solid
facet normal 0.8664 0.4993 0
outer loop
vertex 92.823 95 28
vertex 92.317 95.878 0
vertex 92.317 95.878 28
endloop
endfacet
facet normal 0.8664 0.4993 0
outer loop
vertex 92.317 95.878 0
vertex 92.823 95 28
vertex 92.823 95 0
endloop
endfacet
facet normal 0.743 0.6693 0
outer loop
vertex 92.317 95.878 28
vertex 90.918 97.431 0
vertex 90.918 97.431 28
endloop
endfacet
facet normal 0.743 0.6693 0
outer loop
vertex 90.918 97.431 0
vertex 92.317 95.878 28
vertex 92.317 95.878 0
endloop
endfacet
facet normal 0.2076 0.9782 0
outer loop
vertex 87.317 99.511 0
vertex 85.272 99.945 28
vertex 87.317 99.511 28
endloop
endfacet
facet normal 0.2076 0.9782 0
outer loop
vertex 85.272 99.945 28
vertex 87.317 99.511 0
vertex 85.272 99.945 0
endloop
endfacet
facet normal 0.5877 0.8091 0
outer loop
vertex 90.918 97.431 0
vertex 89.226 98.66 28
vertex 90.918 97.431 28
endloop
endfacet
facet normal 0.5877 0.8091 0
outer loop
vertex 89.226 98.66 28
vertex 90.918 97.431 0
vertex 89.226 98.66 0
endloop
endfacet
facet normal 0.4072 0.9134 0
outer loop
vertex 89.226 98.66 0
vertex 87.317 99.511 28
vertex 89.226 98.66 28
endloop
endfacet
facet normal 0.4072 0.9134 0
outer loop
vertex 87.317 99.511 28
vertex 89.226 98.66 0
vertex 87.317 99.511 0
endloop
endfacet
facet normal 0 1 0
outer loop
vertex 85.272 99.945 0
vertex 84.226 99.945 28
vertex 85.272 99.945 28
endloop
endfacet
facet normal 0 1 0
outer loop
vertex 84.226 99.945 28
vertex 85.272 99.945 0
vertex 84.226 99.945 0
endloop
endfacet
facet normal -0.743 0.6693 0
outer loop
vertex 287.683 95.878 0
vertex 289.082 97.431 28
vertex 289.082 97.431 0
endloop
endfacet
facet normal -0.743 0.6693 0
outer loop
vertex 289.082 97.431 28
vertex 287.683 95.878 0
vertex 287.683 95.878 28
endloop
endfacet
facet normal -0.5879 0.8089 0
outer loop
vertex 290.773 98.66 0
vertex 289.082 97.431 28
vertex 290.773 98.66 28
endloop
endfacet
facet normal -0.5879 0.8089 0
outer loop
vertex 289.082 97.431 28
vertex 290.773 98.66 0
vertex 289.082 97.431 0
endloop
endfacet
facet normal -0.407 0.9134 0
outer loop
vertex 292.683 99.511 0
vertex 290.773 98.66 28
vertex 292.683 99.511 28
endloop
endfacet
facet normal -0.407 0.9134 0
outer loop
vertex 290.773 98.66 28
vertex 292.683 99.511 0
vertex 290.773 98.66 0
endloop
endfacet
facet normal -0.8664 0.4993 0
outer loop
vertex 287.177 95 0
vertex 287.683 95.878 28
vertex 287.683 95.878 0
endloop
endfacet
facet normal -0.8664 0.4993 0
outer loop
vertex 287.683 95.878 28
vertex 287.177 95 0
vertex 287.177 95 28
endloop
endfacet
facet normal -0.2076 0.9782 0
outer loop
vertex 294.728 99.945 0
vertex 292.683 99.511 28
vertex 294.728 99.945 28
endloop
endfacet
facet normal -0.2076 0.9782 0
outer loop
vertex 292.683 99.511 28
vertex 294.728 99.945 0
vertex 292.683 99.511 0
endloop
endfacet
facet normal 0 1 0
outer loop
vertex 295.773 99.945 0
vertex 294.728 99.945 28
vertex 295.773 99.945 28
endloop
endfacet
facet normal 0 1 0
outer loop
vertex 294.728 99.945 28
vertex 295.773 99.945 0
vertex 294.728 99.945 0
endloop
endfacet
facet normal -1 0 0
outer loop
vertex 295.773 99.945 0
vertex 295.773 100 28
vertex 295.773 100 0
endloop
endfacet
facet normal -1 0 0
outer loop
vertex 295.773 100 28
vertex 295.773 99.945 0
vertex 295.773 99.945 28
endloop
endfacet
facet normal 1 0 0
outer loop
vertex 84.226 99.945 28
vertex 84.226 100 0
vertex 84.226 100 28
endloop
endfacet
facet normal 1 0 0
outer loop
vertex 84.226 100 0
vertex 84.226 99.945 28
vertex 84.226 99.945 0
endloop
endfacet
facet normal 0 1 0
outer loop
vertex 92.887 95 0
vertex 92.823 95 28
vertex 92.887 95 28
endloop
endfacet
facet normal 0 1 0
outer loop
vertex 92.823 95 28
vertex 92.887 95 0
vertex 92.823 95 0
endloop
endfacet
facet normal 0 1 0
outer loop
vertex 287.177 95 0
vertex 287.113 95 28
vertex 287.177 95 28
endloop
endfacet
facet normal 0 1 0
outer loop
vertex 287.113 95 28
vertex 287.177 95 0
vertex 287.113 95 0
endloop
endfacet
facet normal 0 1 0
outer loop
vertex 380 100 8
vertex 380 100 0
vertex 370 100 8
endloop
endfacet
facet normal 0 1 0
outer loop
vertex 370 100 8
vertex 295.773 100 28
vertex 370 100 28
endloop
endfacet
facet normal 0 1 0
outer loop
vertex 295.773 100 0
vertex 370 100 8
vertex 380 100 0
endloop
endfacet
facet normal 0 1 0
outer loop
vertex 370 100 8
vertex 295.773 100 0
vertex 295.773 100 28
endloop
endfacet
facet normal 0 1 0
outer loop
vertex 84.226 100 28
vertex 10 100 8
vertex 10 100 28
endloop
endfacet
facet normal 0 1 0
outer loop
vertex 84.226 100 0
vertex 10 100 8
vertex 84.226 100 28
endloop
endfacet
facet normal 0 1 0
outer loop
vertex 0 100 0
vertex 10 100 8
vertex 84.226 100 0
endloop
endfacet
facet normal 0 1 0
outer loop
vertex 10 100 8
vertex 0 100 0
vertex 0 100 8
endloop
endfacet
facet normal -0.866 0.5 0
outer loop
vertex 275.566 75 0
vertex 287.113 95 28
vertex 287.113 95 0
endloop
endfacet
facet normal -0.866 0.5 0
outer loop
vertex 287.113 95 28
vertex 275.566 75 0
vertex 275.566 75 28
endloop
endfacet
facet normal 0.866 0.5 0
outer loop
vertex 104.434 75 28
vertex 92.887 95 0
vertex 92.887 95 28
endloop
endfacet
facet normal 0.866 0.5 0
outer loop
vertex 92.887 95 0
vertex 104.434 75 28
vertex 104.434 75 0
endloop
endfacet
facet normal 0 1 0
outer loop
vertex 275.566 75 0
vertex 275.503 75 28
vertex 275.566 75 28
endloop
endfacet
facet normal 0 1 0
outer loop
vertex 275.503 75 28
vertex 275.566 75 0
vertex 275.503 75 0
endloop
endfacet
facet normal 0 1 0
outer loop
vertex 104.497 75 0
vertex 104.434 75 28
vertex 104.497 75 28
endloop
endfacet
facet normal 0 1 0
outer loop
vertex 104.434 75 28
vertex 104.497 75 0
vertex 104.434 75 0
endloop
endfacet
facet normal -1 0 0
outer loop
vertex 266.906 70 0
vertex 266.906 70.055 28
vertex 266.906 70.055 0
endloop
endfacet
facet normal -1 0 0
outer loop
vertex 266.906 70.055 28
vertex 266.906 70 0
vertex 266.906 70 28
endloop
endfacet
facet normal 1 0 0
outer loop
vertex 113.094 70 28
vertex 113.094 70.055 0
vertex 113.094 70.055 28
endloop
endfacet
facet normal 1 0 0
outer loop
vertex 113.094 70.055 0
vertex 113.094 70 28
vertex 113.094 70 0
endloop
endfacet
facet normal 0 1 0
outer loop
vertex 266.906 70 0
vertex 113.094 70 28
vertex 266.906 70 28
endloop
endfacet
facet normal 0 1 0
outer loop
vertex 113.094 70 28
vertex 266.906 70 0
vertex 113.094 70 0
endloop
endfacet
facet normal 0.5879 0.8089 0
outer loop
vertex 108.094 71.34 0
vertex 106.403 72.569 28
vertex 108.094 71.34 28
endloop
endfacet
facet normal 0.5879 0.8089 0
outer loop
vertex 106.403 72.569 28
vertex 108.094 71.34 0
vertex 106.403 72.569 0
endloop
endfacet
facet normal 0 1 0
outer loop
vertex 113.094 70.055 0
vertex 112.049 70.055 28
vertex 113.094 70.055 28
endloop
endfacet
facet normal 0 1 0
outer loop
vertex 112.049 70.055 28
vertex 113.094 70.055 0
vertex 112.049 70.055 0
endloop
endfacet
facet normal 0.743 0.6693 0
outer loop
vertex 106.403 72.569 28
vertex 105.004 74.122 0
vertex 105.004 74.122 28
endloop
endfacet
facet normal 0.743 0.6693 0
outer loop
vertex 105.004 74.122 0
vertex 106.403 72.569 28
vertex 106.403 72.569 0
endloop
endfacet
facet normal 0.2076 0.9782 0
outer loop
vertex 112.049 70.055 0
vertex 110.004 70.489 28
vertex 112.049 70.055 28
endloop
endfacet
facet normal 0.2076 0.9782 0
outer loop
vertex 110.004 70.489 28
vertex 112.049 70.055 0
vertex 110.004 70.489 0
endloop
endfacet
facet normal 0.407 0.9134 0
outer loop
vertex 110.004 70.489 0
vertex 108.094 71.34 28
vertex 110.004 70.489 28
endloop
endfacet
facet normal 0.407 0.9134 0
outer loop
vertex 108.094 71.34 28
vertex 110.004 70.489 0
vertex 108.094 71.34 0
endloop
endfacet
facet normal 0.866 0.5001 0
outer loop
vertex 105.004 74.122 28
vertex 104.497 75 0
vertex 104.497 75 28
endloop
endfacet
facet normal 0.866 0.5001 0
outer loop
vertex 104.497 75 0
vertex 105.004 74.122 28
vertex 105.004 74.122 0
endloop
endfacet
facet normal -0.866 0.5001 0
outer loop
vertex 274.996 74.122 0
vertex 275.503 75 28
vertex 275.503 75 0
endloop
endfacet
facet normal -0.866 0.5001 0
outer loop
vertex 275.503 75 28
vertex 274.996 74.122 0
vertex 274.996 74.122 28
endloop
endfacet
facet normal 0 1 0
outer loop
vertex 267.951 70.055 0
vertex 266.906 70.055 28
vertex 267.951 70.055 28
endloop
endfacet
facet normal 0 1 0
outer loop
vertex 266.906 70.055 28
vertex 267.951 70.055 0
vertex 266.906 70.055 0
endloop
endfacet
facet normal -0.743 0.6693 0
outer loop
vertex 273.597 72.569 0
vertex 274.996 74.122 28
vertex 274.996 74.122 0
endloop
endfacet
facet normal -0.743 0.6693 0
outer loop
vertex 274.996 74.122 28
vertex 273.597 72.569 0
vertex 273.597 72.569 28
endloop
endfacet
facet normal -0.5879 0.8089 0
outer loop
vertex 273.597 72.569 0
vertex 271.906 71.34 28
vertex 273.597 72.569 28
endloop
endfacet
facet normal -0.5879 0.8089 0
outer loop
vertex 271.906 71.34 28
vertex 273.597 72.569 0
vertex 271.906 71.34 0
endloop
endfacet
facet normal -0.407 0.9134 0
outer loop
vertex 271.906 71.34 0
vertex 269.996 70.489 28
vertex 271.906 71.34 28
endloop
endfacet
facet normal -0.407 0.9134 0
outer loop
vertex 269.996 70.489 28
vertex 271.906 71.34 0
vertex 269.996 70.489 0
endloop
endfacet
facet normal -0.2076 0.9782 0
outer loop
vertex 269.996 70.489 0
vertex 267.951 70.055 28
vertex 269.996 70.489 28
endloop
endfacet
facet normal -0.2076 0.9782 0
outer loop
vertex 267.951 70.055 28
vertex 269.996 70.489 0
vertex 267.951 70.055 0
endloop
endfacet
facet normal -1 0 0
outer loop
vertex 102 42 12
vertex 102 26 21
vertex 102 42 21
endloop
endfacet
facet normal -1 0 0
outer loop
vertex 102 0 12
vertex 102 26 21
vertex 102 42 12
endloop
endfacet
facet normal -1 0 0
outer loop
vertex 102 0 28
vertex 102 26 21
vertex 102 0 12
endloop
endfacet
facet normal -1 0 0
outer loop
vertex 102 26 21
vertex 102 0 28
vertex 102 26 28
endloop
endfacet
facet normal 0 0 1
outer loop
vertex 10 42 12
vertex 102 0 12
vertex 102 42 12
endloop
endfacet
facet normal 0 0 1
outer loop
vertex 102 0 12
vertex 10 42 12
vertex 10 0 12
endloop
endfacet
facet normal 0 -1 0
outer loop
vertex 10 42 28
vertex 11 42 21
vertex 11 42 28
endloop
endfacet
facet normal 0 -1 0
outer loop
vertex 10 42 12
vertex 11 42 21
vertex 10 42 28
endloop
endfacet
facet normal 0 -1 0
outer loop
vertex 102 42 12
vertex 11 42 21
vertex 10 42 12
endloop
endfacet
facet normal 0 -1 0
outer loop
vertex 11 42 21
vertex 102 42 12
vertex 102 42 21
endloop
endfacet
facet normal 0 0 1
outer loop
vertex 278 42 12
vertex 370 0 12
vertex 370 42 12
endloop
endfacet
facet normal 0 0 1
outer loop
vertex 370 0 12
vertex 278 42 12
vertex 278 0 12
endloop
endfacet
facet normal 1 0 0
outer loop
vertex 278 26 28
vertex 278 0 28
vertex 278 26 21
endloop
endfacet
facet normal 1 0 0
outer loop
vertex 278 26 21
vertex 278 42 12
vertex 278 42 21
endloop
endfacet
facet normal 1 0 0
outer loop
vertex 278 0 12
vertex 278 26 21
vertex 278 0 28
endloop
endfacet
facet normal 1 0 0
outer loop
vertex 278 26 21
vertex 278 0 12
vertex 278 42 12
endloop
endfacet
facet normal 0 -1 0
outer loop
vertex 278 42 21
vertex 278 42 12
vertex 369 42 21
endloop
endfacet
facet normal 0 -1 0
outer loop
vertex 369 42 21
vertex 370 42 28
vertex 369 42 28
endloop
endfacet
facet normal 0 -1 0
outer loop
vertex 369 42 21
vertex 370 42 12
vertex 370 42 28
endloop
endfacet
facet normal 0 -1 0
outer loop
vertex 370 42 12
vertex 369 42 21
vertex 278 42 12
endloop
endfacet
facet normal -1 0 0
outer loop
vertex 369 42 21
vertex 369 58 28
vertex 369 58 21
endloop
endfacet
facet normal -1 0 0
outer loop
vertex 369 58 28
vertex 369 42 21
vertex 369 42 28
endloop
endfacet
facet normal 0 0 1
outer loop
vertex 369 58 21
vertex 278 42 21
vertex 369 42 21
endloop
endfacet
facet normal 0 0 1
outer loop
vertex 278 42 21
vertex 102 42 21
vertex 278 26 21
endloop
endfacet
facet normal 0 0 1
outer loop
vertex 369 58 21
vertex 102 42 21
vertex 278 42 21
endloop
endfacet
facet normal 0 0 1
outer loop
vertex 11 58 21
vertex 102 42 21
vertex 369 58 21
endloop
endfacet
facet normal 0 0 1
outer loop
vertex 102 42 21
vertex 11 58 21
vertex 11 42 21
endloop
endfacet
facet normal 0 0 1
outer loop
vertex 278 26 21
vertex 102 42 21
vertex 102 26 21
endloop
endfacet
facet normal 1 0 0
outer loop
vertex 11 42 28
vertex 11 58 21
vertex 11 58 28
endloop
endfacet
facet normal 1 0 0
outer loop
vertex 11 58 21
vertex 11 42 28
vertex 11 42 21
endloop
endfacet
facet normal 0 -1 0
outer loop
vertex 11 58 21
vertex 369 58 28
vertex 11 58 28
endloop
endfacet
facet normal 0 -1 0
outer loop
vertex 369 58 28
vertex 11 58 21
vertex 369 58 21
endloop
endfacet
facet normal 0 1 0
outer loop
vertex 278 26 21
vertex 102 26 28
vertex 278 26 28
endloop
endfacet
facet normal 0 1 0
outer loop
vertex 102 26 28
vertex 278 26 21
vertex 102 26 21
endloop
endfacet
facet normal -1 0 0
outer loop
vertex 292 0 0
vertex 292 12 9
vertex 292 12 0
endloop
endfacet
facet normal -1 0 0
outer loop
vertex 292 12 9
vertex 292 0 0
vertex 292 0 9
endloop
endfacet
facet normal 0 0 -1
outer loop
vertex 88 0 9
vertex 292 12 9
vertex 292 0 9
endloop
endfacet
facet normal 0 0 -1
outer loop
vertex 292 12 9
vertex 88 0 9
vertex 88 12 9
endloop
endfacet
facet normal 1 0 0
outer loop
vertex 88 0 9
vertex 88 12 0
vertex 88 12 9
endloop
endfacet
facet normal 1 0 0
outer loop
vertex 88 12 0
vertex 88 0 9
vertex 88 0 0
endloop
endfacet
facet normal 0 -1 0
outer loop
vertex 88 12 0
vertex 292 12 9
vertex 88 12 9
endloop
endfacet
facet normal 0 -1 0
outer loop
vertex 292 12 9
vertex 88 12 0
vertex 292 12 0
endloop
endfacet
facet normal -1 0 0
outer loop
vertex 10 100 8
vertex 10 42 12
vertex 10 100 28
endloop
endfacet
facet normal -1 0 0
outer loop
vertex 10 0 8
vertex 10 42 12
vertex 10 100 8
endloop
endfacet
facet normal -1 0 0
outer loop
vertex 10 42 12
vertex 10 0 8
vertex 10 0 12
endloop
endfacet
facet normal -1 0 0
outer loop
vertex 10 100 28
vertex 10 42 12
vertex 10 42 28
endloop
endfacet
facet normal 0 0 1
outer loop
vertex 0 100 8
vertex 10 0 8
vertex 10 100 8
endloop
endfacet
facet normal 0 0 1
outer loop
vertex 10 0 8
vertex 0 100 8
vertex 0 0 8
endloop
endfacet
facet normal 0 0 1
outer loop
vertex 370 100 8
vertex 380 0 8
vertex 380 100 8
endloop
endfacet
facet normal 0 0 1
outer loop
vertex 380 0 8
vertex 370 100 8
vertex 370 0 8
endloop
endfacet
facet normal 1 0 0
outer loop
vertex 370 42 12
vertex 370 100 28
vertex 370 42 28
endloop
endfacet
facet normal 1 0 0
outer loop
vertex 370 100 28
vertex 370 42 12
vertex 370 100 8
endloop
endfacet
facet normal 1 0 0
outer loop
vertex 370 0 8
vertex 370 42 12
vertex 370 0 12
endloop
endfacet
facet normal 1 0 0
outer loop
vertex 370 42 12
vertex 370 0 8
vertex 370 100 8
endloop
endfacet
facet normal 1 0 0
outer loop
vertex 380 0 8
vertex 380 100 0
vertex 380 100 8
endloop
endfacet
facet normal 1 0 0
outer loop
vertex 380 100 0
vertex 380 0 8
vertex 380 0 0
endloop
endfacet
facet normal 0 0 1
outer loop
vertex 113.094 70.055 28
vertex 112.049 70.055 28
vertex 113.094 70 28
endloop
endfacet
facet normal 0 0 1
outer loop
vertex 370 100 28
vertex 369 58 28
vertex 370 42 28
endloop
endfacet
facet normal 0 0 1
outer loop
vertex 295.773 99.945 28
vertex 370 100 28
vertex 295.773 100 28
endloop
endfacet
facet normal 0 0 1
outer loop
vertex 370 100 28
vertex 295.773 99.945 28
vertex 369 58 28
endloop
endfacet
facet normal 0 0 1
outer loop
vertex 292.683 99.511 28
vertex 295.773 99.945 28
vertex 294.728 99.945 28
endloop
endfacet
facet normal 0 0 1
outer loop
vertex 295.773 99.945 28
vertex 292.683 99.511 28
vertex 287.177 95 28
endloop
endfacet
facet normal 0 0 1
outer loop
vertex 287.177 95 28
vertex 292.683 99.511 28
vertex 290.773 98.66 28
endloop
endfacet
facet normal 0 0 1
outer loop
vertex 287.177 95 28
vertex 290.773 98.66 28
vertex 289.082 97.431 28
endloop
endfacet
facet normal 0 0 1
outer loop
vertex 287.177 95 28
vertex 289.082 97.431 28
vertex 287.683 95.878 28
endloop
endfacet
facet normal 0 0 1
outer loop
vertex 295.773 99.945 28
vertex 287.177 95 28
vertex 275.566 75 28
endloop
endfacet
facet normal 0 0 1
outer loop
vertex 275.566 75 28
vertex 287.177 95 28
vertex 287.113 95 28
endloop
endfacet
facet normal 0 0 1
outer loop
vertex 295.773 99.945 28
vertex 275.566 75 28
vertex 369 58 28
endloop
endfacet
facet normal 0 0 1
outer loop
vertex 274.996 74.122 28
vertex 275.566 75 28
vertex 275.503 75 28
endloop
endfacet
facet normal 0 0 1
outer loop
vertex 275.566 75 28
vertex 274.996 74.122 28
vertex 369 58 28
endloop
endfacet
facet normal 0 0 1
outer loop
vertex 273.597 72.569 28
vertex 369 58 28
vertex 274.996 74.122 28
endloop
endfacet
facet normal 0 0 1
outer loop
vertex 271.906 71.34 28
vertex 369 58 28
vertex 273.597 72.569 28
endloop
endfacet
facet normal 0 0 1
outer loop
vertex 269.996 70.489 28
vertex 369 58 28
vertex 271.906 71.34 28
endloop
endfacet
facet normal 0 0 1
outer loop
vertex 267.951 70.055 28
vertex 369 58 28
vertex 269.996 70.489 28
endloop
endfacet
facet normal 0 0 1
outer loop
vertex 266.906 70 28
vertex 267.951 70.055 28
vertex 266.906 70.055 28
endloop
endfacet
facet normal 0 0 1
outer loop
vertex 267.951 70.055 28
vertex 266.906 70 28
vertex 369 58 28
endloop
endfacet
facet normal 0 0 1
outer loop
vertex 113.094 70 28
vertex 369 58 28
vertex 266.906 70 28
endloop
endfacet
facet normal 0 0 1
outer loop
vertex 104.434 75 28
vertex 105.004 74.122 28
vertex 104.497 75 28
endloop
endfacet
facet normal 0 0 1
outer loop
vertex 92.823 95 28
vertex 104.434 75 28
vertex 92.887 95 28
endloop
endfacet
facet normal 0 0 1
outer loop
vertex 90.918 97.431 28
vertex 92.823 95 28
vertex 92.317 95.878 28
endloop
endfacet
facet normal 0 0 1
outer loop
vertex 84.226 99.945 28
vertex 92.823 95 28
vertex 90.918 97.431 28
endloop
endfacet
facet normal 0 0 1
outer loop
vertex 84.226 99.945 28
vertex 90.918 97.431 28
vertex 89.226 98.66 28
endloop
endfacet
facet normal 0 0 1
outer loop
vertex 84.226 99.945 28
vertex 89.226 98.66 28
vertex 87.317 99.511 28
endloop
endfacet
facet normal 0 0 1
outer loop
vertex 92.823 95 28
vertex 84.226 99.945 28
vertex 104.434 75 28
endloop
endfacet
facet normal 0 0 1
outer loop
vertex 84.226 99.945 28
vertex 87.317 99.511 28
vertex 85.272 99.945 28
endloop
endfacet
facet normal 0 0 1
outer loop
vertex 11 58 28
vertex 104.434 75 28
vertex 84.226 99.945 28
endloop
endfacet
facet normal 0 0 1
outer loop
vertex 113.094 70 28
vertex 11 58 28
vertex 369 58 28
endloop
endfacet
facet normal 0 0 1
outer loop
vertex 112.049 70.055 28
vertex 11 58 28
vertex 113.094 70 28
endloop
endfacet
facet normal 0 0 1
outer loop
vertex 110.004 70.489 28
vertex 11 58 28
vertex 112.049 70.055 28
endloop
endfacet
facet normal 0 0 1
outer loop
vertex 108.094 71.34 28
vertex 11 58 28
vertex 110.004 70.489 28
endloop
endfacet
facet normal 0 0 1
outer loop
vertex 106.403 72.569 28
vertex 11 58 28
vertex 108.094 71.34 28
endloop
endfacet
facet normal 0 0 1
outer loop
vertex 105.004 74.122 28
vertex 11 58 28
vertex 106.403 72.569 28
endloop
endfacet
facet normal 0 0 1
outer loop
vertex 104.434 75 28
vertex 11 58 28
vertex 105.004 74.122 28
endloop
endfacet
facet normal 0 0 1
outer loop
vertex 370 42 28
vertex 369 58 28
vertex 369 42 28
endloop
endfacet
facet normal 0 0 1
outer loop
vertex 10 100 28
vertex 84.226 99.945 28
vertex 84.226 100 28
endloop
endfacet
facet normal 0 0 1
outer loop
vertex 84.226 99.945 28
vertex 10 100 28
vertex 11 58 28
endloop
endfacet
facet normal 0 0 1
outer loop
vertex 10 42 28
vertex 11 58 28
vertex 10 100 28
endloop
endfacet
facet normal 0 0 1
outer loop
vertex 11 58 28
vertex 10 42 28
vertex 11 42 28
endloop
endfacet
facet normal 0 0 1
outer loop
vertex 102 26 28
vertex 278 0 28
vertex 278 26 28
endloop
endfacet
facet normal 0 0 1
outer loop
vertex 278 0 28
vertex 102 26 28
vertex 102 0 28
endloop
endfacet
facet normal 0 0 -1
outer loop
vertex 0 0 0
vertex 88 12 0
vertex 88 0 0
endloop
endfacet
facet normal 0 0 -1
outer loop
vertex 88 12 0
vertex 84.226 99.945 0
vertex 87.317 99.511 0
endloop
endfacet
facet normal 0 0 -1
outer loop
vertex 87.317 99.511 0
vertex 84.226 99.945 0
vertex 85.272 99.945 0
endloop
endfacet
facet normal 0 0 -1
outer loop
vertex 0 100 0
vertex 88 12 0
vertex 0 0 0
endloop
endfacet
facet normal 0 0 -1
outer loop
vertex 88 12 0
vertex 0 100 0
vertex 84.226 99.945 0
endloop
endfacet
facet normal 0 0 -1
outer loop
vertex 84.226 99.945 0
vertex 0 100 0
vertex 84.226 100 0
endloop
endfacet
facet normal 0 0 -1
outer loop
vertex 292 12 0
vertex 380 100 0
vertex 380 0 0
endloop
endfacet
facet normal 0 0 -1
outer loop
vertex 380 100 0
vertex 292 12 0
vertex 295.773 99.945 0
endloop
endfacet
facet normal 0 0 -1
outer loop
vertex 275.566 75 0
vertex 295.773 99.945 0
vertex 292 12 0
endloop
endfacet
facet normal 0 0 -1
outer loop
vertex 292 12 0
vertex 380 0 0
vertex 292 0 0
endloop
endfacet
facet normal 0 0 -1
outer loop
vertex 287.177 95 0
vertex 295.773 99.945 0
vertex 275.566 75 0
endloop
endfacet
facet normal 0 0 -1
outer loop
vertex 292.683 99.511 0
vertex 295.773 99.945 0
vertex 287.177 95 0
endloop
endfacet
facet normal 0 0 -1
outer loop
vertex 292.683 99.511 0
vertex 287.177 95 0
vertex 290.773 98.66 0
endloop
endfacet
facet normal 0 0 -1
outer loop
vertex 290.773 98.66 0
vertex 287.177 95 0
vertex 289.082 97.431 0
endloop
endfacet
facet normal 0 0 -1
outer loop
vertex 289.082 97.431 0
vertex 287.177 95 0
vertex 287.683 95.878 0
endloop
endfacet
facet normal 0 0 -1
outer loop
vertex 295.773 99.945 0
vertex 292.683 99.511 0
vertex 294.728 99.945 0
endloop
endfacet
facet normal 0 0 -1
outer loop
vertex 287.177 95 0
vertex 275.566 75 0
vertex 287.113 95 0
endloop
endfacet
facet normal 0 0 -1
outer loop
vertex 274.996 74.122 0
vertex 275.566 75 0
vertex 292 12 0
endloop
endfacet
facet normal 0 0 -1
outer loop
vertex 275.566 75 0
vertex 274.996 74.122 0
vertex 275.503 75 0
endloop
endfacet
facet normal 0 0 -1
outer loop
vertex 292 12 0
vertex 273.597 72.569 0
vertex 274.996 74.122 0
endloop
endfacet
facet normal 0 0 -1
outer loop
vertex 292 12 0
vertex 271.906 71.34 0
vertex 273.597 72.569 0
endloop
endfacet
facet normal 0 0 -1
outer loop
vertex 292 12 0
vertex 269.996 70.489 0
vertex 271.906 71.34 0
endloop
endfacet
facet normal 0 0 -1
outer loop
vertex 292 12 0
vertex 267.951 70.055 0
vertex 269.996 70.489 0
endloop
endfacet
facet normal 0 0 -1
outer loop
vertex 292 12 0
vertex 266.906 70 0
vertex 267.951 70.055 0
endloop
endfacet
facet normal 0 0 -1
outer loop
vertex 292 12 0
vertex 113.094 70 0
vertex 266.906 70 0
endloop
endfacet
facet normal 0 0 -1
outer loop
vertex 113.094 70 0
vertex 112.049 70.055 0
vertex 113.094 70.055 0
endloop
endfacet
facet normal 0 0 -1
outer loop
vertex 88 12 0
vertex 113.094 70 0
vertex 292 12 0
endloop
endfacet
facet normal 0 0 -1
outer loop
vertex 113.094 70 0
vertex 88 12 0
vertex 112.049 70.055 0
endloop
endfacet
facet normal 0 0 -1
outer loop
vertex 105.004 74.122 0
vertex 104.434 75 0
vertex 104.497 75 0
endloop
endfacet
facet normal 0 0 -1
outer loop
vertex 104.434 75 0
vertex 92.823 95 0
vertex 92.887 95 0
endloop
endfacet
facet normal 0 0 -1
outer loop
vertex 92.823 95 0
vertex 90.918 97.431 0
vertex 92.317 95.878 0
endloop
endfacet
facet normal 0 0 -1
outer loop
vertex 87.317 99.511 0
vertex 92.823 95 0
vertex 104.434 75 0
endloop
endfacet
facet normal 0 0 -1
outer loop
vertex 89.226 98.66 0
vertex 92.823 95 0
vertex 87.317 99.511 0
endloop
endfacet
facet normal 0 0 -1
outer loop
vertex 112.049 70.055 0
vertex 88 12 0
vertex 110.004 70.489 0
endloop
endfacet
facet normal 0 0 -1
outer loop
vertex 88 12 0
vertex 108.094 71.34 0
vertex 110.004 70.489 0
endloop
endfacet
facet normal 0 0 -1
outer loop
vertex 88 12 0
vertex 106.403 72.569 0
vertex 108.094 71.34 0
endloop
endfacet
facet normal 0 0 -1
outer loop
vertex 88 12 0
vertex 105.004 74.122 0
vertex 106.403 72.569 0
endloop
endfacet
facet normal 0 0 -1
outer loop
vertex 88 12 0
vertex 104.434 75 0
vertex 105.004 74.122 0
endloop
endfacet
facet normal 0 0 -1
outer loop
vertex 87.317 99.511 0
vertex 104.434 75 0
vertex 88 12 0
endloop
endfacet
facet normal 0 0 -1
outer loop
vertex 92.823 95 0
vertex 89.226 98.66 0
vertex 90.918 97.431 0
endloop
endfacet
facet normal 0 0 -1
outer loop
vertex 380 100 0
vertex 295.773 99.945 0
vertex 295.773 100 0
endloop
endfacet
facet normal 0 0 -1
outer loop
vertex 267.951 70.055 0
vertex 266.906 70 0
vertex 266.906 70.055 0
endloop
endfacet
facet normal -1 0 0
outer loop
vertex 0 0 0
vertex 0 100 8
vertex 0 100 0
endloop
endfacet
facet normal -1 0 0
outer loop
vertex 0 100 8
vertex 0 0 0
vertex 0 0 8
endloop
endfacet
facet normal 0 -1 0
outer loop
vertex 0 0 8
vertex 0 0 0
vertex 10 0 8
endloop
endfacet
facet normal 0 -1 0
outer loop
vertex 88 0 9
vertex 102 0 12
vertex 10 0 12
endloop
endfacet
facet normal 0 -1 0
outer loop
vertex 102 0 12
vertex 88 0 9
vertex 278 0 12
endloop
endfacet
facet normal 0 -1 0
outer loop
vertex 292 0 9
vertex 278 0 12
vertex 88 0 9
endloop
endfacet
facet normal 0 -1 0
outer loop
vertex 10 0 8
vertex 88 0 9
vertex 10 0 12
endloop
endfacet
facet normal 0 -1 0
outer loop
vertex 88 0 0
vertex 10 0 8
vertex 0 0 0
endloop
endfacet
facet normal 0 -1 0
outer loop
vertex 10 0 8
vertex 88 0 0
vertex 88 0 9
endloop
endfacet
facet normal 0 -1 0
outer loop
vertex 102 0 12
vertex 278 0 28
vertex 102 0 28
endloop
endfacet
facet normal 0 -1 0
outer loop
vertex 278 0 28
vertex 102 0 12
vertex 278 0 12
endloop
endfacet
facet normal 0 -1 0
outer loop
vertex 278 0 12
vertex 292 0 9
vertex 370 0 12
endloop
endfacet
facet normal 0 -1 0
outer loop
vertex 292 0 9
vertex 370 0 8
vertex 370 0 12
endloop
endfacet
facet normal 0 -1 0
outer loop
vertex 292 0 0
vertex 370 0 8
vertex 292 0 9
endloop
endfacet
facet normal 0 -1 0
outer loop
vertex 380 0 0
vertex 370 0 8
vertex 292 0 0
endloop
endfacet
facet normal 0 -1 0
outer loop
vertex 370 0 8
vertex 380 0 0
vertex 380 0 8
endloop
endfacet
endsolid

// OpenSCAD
include <../src/wardrobe.scad>;
plank_yz_side_bottom();
//github_openscad -o wardrobe_1/plank_yz_side_bottom.stl -D wardrobe_n=1 -D cutting_edge=0 -D break_view_length=0 wardrobe_1/plank_yz_side_bottom_stl.scad
